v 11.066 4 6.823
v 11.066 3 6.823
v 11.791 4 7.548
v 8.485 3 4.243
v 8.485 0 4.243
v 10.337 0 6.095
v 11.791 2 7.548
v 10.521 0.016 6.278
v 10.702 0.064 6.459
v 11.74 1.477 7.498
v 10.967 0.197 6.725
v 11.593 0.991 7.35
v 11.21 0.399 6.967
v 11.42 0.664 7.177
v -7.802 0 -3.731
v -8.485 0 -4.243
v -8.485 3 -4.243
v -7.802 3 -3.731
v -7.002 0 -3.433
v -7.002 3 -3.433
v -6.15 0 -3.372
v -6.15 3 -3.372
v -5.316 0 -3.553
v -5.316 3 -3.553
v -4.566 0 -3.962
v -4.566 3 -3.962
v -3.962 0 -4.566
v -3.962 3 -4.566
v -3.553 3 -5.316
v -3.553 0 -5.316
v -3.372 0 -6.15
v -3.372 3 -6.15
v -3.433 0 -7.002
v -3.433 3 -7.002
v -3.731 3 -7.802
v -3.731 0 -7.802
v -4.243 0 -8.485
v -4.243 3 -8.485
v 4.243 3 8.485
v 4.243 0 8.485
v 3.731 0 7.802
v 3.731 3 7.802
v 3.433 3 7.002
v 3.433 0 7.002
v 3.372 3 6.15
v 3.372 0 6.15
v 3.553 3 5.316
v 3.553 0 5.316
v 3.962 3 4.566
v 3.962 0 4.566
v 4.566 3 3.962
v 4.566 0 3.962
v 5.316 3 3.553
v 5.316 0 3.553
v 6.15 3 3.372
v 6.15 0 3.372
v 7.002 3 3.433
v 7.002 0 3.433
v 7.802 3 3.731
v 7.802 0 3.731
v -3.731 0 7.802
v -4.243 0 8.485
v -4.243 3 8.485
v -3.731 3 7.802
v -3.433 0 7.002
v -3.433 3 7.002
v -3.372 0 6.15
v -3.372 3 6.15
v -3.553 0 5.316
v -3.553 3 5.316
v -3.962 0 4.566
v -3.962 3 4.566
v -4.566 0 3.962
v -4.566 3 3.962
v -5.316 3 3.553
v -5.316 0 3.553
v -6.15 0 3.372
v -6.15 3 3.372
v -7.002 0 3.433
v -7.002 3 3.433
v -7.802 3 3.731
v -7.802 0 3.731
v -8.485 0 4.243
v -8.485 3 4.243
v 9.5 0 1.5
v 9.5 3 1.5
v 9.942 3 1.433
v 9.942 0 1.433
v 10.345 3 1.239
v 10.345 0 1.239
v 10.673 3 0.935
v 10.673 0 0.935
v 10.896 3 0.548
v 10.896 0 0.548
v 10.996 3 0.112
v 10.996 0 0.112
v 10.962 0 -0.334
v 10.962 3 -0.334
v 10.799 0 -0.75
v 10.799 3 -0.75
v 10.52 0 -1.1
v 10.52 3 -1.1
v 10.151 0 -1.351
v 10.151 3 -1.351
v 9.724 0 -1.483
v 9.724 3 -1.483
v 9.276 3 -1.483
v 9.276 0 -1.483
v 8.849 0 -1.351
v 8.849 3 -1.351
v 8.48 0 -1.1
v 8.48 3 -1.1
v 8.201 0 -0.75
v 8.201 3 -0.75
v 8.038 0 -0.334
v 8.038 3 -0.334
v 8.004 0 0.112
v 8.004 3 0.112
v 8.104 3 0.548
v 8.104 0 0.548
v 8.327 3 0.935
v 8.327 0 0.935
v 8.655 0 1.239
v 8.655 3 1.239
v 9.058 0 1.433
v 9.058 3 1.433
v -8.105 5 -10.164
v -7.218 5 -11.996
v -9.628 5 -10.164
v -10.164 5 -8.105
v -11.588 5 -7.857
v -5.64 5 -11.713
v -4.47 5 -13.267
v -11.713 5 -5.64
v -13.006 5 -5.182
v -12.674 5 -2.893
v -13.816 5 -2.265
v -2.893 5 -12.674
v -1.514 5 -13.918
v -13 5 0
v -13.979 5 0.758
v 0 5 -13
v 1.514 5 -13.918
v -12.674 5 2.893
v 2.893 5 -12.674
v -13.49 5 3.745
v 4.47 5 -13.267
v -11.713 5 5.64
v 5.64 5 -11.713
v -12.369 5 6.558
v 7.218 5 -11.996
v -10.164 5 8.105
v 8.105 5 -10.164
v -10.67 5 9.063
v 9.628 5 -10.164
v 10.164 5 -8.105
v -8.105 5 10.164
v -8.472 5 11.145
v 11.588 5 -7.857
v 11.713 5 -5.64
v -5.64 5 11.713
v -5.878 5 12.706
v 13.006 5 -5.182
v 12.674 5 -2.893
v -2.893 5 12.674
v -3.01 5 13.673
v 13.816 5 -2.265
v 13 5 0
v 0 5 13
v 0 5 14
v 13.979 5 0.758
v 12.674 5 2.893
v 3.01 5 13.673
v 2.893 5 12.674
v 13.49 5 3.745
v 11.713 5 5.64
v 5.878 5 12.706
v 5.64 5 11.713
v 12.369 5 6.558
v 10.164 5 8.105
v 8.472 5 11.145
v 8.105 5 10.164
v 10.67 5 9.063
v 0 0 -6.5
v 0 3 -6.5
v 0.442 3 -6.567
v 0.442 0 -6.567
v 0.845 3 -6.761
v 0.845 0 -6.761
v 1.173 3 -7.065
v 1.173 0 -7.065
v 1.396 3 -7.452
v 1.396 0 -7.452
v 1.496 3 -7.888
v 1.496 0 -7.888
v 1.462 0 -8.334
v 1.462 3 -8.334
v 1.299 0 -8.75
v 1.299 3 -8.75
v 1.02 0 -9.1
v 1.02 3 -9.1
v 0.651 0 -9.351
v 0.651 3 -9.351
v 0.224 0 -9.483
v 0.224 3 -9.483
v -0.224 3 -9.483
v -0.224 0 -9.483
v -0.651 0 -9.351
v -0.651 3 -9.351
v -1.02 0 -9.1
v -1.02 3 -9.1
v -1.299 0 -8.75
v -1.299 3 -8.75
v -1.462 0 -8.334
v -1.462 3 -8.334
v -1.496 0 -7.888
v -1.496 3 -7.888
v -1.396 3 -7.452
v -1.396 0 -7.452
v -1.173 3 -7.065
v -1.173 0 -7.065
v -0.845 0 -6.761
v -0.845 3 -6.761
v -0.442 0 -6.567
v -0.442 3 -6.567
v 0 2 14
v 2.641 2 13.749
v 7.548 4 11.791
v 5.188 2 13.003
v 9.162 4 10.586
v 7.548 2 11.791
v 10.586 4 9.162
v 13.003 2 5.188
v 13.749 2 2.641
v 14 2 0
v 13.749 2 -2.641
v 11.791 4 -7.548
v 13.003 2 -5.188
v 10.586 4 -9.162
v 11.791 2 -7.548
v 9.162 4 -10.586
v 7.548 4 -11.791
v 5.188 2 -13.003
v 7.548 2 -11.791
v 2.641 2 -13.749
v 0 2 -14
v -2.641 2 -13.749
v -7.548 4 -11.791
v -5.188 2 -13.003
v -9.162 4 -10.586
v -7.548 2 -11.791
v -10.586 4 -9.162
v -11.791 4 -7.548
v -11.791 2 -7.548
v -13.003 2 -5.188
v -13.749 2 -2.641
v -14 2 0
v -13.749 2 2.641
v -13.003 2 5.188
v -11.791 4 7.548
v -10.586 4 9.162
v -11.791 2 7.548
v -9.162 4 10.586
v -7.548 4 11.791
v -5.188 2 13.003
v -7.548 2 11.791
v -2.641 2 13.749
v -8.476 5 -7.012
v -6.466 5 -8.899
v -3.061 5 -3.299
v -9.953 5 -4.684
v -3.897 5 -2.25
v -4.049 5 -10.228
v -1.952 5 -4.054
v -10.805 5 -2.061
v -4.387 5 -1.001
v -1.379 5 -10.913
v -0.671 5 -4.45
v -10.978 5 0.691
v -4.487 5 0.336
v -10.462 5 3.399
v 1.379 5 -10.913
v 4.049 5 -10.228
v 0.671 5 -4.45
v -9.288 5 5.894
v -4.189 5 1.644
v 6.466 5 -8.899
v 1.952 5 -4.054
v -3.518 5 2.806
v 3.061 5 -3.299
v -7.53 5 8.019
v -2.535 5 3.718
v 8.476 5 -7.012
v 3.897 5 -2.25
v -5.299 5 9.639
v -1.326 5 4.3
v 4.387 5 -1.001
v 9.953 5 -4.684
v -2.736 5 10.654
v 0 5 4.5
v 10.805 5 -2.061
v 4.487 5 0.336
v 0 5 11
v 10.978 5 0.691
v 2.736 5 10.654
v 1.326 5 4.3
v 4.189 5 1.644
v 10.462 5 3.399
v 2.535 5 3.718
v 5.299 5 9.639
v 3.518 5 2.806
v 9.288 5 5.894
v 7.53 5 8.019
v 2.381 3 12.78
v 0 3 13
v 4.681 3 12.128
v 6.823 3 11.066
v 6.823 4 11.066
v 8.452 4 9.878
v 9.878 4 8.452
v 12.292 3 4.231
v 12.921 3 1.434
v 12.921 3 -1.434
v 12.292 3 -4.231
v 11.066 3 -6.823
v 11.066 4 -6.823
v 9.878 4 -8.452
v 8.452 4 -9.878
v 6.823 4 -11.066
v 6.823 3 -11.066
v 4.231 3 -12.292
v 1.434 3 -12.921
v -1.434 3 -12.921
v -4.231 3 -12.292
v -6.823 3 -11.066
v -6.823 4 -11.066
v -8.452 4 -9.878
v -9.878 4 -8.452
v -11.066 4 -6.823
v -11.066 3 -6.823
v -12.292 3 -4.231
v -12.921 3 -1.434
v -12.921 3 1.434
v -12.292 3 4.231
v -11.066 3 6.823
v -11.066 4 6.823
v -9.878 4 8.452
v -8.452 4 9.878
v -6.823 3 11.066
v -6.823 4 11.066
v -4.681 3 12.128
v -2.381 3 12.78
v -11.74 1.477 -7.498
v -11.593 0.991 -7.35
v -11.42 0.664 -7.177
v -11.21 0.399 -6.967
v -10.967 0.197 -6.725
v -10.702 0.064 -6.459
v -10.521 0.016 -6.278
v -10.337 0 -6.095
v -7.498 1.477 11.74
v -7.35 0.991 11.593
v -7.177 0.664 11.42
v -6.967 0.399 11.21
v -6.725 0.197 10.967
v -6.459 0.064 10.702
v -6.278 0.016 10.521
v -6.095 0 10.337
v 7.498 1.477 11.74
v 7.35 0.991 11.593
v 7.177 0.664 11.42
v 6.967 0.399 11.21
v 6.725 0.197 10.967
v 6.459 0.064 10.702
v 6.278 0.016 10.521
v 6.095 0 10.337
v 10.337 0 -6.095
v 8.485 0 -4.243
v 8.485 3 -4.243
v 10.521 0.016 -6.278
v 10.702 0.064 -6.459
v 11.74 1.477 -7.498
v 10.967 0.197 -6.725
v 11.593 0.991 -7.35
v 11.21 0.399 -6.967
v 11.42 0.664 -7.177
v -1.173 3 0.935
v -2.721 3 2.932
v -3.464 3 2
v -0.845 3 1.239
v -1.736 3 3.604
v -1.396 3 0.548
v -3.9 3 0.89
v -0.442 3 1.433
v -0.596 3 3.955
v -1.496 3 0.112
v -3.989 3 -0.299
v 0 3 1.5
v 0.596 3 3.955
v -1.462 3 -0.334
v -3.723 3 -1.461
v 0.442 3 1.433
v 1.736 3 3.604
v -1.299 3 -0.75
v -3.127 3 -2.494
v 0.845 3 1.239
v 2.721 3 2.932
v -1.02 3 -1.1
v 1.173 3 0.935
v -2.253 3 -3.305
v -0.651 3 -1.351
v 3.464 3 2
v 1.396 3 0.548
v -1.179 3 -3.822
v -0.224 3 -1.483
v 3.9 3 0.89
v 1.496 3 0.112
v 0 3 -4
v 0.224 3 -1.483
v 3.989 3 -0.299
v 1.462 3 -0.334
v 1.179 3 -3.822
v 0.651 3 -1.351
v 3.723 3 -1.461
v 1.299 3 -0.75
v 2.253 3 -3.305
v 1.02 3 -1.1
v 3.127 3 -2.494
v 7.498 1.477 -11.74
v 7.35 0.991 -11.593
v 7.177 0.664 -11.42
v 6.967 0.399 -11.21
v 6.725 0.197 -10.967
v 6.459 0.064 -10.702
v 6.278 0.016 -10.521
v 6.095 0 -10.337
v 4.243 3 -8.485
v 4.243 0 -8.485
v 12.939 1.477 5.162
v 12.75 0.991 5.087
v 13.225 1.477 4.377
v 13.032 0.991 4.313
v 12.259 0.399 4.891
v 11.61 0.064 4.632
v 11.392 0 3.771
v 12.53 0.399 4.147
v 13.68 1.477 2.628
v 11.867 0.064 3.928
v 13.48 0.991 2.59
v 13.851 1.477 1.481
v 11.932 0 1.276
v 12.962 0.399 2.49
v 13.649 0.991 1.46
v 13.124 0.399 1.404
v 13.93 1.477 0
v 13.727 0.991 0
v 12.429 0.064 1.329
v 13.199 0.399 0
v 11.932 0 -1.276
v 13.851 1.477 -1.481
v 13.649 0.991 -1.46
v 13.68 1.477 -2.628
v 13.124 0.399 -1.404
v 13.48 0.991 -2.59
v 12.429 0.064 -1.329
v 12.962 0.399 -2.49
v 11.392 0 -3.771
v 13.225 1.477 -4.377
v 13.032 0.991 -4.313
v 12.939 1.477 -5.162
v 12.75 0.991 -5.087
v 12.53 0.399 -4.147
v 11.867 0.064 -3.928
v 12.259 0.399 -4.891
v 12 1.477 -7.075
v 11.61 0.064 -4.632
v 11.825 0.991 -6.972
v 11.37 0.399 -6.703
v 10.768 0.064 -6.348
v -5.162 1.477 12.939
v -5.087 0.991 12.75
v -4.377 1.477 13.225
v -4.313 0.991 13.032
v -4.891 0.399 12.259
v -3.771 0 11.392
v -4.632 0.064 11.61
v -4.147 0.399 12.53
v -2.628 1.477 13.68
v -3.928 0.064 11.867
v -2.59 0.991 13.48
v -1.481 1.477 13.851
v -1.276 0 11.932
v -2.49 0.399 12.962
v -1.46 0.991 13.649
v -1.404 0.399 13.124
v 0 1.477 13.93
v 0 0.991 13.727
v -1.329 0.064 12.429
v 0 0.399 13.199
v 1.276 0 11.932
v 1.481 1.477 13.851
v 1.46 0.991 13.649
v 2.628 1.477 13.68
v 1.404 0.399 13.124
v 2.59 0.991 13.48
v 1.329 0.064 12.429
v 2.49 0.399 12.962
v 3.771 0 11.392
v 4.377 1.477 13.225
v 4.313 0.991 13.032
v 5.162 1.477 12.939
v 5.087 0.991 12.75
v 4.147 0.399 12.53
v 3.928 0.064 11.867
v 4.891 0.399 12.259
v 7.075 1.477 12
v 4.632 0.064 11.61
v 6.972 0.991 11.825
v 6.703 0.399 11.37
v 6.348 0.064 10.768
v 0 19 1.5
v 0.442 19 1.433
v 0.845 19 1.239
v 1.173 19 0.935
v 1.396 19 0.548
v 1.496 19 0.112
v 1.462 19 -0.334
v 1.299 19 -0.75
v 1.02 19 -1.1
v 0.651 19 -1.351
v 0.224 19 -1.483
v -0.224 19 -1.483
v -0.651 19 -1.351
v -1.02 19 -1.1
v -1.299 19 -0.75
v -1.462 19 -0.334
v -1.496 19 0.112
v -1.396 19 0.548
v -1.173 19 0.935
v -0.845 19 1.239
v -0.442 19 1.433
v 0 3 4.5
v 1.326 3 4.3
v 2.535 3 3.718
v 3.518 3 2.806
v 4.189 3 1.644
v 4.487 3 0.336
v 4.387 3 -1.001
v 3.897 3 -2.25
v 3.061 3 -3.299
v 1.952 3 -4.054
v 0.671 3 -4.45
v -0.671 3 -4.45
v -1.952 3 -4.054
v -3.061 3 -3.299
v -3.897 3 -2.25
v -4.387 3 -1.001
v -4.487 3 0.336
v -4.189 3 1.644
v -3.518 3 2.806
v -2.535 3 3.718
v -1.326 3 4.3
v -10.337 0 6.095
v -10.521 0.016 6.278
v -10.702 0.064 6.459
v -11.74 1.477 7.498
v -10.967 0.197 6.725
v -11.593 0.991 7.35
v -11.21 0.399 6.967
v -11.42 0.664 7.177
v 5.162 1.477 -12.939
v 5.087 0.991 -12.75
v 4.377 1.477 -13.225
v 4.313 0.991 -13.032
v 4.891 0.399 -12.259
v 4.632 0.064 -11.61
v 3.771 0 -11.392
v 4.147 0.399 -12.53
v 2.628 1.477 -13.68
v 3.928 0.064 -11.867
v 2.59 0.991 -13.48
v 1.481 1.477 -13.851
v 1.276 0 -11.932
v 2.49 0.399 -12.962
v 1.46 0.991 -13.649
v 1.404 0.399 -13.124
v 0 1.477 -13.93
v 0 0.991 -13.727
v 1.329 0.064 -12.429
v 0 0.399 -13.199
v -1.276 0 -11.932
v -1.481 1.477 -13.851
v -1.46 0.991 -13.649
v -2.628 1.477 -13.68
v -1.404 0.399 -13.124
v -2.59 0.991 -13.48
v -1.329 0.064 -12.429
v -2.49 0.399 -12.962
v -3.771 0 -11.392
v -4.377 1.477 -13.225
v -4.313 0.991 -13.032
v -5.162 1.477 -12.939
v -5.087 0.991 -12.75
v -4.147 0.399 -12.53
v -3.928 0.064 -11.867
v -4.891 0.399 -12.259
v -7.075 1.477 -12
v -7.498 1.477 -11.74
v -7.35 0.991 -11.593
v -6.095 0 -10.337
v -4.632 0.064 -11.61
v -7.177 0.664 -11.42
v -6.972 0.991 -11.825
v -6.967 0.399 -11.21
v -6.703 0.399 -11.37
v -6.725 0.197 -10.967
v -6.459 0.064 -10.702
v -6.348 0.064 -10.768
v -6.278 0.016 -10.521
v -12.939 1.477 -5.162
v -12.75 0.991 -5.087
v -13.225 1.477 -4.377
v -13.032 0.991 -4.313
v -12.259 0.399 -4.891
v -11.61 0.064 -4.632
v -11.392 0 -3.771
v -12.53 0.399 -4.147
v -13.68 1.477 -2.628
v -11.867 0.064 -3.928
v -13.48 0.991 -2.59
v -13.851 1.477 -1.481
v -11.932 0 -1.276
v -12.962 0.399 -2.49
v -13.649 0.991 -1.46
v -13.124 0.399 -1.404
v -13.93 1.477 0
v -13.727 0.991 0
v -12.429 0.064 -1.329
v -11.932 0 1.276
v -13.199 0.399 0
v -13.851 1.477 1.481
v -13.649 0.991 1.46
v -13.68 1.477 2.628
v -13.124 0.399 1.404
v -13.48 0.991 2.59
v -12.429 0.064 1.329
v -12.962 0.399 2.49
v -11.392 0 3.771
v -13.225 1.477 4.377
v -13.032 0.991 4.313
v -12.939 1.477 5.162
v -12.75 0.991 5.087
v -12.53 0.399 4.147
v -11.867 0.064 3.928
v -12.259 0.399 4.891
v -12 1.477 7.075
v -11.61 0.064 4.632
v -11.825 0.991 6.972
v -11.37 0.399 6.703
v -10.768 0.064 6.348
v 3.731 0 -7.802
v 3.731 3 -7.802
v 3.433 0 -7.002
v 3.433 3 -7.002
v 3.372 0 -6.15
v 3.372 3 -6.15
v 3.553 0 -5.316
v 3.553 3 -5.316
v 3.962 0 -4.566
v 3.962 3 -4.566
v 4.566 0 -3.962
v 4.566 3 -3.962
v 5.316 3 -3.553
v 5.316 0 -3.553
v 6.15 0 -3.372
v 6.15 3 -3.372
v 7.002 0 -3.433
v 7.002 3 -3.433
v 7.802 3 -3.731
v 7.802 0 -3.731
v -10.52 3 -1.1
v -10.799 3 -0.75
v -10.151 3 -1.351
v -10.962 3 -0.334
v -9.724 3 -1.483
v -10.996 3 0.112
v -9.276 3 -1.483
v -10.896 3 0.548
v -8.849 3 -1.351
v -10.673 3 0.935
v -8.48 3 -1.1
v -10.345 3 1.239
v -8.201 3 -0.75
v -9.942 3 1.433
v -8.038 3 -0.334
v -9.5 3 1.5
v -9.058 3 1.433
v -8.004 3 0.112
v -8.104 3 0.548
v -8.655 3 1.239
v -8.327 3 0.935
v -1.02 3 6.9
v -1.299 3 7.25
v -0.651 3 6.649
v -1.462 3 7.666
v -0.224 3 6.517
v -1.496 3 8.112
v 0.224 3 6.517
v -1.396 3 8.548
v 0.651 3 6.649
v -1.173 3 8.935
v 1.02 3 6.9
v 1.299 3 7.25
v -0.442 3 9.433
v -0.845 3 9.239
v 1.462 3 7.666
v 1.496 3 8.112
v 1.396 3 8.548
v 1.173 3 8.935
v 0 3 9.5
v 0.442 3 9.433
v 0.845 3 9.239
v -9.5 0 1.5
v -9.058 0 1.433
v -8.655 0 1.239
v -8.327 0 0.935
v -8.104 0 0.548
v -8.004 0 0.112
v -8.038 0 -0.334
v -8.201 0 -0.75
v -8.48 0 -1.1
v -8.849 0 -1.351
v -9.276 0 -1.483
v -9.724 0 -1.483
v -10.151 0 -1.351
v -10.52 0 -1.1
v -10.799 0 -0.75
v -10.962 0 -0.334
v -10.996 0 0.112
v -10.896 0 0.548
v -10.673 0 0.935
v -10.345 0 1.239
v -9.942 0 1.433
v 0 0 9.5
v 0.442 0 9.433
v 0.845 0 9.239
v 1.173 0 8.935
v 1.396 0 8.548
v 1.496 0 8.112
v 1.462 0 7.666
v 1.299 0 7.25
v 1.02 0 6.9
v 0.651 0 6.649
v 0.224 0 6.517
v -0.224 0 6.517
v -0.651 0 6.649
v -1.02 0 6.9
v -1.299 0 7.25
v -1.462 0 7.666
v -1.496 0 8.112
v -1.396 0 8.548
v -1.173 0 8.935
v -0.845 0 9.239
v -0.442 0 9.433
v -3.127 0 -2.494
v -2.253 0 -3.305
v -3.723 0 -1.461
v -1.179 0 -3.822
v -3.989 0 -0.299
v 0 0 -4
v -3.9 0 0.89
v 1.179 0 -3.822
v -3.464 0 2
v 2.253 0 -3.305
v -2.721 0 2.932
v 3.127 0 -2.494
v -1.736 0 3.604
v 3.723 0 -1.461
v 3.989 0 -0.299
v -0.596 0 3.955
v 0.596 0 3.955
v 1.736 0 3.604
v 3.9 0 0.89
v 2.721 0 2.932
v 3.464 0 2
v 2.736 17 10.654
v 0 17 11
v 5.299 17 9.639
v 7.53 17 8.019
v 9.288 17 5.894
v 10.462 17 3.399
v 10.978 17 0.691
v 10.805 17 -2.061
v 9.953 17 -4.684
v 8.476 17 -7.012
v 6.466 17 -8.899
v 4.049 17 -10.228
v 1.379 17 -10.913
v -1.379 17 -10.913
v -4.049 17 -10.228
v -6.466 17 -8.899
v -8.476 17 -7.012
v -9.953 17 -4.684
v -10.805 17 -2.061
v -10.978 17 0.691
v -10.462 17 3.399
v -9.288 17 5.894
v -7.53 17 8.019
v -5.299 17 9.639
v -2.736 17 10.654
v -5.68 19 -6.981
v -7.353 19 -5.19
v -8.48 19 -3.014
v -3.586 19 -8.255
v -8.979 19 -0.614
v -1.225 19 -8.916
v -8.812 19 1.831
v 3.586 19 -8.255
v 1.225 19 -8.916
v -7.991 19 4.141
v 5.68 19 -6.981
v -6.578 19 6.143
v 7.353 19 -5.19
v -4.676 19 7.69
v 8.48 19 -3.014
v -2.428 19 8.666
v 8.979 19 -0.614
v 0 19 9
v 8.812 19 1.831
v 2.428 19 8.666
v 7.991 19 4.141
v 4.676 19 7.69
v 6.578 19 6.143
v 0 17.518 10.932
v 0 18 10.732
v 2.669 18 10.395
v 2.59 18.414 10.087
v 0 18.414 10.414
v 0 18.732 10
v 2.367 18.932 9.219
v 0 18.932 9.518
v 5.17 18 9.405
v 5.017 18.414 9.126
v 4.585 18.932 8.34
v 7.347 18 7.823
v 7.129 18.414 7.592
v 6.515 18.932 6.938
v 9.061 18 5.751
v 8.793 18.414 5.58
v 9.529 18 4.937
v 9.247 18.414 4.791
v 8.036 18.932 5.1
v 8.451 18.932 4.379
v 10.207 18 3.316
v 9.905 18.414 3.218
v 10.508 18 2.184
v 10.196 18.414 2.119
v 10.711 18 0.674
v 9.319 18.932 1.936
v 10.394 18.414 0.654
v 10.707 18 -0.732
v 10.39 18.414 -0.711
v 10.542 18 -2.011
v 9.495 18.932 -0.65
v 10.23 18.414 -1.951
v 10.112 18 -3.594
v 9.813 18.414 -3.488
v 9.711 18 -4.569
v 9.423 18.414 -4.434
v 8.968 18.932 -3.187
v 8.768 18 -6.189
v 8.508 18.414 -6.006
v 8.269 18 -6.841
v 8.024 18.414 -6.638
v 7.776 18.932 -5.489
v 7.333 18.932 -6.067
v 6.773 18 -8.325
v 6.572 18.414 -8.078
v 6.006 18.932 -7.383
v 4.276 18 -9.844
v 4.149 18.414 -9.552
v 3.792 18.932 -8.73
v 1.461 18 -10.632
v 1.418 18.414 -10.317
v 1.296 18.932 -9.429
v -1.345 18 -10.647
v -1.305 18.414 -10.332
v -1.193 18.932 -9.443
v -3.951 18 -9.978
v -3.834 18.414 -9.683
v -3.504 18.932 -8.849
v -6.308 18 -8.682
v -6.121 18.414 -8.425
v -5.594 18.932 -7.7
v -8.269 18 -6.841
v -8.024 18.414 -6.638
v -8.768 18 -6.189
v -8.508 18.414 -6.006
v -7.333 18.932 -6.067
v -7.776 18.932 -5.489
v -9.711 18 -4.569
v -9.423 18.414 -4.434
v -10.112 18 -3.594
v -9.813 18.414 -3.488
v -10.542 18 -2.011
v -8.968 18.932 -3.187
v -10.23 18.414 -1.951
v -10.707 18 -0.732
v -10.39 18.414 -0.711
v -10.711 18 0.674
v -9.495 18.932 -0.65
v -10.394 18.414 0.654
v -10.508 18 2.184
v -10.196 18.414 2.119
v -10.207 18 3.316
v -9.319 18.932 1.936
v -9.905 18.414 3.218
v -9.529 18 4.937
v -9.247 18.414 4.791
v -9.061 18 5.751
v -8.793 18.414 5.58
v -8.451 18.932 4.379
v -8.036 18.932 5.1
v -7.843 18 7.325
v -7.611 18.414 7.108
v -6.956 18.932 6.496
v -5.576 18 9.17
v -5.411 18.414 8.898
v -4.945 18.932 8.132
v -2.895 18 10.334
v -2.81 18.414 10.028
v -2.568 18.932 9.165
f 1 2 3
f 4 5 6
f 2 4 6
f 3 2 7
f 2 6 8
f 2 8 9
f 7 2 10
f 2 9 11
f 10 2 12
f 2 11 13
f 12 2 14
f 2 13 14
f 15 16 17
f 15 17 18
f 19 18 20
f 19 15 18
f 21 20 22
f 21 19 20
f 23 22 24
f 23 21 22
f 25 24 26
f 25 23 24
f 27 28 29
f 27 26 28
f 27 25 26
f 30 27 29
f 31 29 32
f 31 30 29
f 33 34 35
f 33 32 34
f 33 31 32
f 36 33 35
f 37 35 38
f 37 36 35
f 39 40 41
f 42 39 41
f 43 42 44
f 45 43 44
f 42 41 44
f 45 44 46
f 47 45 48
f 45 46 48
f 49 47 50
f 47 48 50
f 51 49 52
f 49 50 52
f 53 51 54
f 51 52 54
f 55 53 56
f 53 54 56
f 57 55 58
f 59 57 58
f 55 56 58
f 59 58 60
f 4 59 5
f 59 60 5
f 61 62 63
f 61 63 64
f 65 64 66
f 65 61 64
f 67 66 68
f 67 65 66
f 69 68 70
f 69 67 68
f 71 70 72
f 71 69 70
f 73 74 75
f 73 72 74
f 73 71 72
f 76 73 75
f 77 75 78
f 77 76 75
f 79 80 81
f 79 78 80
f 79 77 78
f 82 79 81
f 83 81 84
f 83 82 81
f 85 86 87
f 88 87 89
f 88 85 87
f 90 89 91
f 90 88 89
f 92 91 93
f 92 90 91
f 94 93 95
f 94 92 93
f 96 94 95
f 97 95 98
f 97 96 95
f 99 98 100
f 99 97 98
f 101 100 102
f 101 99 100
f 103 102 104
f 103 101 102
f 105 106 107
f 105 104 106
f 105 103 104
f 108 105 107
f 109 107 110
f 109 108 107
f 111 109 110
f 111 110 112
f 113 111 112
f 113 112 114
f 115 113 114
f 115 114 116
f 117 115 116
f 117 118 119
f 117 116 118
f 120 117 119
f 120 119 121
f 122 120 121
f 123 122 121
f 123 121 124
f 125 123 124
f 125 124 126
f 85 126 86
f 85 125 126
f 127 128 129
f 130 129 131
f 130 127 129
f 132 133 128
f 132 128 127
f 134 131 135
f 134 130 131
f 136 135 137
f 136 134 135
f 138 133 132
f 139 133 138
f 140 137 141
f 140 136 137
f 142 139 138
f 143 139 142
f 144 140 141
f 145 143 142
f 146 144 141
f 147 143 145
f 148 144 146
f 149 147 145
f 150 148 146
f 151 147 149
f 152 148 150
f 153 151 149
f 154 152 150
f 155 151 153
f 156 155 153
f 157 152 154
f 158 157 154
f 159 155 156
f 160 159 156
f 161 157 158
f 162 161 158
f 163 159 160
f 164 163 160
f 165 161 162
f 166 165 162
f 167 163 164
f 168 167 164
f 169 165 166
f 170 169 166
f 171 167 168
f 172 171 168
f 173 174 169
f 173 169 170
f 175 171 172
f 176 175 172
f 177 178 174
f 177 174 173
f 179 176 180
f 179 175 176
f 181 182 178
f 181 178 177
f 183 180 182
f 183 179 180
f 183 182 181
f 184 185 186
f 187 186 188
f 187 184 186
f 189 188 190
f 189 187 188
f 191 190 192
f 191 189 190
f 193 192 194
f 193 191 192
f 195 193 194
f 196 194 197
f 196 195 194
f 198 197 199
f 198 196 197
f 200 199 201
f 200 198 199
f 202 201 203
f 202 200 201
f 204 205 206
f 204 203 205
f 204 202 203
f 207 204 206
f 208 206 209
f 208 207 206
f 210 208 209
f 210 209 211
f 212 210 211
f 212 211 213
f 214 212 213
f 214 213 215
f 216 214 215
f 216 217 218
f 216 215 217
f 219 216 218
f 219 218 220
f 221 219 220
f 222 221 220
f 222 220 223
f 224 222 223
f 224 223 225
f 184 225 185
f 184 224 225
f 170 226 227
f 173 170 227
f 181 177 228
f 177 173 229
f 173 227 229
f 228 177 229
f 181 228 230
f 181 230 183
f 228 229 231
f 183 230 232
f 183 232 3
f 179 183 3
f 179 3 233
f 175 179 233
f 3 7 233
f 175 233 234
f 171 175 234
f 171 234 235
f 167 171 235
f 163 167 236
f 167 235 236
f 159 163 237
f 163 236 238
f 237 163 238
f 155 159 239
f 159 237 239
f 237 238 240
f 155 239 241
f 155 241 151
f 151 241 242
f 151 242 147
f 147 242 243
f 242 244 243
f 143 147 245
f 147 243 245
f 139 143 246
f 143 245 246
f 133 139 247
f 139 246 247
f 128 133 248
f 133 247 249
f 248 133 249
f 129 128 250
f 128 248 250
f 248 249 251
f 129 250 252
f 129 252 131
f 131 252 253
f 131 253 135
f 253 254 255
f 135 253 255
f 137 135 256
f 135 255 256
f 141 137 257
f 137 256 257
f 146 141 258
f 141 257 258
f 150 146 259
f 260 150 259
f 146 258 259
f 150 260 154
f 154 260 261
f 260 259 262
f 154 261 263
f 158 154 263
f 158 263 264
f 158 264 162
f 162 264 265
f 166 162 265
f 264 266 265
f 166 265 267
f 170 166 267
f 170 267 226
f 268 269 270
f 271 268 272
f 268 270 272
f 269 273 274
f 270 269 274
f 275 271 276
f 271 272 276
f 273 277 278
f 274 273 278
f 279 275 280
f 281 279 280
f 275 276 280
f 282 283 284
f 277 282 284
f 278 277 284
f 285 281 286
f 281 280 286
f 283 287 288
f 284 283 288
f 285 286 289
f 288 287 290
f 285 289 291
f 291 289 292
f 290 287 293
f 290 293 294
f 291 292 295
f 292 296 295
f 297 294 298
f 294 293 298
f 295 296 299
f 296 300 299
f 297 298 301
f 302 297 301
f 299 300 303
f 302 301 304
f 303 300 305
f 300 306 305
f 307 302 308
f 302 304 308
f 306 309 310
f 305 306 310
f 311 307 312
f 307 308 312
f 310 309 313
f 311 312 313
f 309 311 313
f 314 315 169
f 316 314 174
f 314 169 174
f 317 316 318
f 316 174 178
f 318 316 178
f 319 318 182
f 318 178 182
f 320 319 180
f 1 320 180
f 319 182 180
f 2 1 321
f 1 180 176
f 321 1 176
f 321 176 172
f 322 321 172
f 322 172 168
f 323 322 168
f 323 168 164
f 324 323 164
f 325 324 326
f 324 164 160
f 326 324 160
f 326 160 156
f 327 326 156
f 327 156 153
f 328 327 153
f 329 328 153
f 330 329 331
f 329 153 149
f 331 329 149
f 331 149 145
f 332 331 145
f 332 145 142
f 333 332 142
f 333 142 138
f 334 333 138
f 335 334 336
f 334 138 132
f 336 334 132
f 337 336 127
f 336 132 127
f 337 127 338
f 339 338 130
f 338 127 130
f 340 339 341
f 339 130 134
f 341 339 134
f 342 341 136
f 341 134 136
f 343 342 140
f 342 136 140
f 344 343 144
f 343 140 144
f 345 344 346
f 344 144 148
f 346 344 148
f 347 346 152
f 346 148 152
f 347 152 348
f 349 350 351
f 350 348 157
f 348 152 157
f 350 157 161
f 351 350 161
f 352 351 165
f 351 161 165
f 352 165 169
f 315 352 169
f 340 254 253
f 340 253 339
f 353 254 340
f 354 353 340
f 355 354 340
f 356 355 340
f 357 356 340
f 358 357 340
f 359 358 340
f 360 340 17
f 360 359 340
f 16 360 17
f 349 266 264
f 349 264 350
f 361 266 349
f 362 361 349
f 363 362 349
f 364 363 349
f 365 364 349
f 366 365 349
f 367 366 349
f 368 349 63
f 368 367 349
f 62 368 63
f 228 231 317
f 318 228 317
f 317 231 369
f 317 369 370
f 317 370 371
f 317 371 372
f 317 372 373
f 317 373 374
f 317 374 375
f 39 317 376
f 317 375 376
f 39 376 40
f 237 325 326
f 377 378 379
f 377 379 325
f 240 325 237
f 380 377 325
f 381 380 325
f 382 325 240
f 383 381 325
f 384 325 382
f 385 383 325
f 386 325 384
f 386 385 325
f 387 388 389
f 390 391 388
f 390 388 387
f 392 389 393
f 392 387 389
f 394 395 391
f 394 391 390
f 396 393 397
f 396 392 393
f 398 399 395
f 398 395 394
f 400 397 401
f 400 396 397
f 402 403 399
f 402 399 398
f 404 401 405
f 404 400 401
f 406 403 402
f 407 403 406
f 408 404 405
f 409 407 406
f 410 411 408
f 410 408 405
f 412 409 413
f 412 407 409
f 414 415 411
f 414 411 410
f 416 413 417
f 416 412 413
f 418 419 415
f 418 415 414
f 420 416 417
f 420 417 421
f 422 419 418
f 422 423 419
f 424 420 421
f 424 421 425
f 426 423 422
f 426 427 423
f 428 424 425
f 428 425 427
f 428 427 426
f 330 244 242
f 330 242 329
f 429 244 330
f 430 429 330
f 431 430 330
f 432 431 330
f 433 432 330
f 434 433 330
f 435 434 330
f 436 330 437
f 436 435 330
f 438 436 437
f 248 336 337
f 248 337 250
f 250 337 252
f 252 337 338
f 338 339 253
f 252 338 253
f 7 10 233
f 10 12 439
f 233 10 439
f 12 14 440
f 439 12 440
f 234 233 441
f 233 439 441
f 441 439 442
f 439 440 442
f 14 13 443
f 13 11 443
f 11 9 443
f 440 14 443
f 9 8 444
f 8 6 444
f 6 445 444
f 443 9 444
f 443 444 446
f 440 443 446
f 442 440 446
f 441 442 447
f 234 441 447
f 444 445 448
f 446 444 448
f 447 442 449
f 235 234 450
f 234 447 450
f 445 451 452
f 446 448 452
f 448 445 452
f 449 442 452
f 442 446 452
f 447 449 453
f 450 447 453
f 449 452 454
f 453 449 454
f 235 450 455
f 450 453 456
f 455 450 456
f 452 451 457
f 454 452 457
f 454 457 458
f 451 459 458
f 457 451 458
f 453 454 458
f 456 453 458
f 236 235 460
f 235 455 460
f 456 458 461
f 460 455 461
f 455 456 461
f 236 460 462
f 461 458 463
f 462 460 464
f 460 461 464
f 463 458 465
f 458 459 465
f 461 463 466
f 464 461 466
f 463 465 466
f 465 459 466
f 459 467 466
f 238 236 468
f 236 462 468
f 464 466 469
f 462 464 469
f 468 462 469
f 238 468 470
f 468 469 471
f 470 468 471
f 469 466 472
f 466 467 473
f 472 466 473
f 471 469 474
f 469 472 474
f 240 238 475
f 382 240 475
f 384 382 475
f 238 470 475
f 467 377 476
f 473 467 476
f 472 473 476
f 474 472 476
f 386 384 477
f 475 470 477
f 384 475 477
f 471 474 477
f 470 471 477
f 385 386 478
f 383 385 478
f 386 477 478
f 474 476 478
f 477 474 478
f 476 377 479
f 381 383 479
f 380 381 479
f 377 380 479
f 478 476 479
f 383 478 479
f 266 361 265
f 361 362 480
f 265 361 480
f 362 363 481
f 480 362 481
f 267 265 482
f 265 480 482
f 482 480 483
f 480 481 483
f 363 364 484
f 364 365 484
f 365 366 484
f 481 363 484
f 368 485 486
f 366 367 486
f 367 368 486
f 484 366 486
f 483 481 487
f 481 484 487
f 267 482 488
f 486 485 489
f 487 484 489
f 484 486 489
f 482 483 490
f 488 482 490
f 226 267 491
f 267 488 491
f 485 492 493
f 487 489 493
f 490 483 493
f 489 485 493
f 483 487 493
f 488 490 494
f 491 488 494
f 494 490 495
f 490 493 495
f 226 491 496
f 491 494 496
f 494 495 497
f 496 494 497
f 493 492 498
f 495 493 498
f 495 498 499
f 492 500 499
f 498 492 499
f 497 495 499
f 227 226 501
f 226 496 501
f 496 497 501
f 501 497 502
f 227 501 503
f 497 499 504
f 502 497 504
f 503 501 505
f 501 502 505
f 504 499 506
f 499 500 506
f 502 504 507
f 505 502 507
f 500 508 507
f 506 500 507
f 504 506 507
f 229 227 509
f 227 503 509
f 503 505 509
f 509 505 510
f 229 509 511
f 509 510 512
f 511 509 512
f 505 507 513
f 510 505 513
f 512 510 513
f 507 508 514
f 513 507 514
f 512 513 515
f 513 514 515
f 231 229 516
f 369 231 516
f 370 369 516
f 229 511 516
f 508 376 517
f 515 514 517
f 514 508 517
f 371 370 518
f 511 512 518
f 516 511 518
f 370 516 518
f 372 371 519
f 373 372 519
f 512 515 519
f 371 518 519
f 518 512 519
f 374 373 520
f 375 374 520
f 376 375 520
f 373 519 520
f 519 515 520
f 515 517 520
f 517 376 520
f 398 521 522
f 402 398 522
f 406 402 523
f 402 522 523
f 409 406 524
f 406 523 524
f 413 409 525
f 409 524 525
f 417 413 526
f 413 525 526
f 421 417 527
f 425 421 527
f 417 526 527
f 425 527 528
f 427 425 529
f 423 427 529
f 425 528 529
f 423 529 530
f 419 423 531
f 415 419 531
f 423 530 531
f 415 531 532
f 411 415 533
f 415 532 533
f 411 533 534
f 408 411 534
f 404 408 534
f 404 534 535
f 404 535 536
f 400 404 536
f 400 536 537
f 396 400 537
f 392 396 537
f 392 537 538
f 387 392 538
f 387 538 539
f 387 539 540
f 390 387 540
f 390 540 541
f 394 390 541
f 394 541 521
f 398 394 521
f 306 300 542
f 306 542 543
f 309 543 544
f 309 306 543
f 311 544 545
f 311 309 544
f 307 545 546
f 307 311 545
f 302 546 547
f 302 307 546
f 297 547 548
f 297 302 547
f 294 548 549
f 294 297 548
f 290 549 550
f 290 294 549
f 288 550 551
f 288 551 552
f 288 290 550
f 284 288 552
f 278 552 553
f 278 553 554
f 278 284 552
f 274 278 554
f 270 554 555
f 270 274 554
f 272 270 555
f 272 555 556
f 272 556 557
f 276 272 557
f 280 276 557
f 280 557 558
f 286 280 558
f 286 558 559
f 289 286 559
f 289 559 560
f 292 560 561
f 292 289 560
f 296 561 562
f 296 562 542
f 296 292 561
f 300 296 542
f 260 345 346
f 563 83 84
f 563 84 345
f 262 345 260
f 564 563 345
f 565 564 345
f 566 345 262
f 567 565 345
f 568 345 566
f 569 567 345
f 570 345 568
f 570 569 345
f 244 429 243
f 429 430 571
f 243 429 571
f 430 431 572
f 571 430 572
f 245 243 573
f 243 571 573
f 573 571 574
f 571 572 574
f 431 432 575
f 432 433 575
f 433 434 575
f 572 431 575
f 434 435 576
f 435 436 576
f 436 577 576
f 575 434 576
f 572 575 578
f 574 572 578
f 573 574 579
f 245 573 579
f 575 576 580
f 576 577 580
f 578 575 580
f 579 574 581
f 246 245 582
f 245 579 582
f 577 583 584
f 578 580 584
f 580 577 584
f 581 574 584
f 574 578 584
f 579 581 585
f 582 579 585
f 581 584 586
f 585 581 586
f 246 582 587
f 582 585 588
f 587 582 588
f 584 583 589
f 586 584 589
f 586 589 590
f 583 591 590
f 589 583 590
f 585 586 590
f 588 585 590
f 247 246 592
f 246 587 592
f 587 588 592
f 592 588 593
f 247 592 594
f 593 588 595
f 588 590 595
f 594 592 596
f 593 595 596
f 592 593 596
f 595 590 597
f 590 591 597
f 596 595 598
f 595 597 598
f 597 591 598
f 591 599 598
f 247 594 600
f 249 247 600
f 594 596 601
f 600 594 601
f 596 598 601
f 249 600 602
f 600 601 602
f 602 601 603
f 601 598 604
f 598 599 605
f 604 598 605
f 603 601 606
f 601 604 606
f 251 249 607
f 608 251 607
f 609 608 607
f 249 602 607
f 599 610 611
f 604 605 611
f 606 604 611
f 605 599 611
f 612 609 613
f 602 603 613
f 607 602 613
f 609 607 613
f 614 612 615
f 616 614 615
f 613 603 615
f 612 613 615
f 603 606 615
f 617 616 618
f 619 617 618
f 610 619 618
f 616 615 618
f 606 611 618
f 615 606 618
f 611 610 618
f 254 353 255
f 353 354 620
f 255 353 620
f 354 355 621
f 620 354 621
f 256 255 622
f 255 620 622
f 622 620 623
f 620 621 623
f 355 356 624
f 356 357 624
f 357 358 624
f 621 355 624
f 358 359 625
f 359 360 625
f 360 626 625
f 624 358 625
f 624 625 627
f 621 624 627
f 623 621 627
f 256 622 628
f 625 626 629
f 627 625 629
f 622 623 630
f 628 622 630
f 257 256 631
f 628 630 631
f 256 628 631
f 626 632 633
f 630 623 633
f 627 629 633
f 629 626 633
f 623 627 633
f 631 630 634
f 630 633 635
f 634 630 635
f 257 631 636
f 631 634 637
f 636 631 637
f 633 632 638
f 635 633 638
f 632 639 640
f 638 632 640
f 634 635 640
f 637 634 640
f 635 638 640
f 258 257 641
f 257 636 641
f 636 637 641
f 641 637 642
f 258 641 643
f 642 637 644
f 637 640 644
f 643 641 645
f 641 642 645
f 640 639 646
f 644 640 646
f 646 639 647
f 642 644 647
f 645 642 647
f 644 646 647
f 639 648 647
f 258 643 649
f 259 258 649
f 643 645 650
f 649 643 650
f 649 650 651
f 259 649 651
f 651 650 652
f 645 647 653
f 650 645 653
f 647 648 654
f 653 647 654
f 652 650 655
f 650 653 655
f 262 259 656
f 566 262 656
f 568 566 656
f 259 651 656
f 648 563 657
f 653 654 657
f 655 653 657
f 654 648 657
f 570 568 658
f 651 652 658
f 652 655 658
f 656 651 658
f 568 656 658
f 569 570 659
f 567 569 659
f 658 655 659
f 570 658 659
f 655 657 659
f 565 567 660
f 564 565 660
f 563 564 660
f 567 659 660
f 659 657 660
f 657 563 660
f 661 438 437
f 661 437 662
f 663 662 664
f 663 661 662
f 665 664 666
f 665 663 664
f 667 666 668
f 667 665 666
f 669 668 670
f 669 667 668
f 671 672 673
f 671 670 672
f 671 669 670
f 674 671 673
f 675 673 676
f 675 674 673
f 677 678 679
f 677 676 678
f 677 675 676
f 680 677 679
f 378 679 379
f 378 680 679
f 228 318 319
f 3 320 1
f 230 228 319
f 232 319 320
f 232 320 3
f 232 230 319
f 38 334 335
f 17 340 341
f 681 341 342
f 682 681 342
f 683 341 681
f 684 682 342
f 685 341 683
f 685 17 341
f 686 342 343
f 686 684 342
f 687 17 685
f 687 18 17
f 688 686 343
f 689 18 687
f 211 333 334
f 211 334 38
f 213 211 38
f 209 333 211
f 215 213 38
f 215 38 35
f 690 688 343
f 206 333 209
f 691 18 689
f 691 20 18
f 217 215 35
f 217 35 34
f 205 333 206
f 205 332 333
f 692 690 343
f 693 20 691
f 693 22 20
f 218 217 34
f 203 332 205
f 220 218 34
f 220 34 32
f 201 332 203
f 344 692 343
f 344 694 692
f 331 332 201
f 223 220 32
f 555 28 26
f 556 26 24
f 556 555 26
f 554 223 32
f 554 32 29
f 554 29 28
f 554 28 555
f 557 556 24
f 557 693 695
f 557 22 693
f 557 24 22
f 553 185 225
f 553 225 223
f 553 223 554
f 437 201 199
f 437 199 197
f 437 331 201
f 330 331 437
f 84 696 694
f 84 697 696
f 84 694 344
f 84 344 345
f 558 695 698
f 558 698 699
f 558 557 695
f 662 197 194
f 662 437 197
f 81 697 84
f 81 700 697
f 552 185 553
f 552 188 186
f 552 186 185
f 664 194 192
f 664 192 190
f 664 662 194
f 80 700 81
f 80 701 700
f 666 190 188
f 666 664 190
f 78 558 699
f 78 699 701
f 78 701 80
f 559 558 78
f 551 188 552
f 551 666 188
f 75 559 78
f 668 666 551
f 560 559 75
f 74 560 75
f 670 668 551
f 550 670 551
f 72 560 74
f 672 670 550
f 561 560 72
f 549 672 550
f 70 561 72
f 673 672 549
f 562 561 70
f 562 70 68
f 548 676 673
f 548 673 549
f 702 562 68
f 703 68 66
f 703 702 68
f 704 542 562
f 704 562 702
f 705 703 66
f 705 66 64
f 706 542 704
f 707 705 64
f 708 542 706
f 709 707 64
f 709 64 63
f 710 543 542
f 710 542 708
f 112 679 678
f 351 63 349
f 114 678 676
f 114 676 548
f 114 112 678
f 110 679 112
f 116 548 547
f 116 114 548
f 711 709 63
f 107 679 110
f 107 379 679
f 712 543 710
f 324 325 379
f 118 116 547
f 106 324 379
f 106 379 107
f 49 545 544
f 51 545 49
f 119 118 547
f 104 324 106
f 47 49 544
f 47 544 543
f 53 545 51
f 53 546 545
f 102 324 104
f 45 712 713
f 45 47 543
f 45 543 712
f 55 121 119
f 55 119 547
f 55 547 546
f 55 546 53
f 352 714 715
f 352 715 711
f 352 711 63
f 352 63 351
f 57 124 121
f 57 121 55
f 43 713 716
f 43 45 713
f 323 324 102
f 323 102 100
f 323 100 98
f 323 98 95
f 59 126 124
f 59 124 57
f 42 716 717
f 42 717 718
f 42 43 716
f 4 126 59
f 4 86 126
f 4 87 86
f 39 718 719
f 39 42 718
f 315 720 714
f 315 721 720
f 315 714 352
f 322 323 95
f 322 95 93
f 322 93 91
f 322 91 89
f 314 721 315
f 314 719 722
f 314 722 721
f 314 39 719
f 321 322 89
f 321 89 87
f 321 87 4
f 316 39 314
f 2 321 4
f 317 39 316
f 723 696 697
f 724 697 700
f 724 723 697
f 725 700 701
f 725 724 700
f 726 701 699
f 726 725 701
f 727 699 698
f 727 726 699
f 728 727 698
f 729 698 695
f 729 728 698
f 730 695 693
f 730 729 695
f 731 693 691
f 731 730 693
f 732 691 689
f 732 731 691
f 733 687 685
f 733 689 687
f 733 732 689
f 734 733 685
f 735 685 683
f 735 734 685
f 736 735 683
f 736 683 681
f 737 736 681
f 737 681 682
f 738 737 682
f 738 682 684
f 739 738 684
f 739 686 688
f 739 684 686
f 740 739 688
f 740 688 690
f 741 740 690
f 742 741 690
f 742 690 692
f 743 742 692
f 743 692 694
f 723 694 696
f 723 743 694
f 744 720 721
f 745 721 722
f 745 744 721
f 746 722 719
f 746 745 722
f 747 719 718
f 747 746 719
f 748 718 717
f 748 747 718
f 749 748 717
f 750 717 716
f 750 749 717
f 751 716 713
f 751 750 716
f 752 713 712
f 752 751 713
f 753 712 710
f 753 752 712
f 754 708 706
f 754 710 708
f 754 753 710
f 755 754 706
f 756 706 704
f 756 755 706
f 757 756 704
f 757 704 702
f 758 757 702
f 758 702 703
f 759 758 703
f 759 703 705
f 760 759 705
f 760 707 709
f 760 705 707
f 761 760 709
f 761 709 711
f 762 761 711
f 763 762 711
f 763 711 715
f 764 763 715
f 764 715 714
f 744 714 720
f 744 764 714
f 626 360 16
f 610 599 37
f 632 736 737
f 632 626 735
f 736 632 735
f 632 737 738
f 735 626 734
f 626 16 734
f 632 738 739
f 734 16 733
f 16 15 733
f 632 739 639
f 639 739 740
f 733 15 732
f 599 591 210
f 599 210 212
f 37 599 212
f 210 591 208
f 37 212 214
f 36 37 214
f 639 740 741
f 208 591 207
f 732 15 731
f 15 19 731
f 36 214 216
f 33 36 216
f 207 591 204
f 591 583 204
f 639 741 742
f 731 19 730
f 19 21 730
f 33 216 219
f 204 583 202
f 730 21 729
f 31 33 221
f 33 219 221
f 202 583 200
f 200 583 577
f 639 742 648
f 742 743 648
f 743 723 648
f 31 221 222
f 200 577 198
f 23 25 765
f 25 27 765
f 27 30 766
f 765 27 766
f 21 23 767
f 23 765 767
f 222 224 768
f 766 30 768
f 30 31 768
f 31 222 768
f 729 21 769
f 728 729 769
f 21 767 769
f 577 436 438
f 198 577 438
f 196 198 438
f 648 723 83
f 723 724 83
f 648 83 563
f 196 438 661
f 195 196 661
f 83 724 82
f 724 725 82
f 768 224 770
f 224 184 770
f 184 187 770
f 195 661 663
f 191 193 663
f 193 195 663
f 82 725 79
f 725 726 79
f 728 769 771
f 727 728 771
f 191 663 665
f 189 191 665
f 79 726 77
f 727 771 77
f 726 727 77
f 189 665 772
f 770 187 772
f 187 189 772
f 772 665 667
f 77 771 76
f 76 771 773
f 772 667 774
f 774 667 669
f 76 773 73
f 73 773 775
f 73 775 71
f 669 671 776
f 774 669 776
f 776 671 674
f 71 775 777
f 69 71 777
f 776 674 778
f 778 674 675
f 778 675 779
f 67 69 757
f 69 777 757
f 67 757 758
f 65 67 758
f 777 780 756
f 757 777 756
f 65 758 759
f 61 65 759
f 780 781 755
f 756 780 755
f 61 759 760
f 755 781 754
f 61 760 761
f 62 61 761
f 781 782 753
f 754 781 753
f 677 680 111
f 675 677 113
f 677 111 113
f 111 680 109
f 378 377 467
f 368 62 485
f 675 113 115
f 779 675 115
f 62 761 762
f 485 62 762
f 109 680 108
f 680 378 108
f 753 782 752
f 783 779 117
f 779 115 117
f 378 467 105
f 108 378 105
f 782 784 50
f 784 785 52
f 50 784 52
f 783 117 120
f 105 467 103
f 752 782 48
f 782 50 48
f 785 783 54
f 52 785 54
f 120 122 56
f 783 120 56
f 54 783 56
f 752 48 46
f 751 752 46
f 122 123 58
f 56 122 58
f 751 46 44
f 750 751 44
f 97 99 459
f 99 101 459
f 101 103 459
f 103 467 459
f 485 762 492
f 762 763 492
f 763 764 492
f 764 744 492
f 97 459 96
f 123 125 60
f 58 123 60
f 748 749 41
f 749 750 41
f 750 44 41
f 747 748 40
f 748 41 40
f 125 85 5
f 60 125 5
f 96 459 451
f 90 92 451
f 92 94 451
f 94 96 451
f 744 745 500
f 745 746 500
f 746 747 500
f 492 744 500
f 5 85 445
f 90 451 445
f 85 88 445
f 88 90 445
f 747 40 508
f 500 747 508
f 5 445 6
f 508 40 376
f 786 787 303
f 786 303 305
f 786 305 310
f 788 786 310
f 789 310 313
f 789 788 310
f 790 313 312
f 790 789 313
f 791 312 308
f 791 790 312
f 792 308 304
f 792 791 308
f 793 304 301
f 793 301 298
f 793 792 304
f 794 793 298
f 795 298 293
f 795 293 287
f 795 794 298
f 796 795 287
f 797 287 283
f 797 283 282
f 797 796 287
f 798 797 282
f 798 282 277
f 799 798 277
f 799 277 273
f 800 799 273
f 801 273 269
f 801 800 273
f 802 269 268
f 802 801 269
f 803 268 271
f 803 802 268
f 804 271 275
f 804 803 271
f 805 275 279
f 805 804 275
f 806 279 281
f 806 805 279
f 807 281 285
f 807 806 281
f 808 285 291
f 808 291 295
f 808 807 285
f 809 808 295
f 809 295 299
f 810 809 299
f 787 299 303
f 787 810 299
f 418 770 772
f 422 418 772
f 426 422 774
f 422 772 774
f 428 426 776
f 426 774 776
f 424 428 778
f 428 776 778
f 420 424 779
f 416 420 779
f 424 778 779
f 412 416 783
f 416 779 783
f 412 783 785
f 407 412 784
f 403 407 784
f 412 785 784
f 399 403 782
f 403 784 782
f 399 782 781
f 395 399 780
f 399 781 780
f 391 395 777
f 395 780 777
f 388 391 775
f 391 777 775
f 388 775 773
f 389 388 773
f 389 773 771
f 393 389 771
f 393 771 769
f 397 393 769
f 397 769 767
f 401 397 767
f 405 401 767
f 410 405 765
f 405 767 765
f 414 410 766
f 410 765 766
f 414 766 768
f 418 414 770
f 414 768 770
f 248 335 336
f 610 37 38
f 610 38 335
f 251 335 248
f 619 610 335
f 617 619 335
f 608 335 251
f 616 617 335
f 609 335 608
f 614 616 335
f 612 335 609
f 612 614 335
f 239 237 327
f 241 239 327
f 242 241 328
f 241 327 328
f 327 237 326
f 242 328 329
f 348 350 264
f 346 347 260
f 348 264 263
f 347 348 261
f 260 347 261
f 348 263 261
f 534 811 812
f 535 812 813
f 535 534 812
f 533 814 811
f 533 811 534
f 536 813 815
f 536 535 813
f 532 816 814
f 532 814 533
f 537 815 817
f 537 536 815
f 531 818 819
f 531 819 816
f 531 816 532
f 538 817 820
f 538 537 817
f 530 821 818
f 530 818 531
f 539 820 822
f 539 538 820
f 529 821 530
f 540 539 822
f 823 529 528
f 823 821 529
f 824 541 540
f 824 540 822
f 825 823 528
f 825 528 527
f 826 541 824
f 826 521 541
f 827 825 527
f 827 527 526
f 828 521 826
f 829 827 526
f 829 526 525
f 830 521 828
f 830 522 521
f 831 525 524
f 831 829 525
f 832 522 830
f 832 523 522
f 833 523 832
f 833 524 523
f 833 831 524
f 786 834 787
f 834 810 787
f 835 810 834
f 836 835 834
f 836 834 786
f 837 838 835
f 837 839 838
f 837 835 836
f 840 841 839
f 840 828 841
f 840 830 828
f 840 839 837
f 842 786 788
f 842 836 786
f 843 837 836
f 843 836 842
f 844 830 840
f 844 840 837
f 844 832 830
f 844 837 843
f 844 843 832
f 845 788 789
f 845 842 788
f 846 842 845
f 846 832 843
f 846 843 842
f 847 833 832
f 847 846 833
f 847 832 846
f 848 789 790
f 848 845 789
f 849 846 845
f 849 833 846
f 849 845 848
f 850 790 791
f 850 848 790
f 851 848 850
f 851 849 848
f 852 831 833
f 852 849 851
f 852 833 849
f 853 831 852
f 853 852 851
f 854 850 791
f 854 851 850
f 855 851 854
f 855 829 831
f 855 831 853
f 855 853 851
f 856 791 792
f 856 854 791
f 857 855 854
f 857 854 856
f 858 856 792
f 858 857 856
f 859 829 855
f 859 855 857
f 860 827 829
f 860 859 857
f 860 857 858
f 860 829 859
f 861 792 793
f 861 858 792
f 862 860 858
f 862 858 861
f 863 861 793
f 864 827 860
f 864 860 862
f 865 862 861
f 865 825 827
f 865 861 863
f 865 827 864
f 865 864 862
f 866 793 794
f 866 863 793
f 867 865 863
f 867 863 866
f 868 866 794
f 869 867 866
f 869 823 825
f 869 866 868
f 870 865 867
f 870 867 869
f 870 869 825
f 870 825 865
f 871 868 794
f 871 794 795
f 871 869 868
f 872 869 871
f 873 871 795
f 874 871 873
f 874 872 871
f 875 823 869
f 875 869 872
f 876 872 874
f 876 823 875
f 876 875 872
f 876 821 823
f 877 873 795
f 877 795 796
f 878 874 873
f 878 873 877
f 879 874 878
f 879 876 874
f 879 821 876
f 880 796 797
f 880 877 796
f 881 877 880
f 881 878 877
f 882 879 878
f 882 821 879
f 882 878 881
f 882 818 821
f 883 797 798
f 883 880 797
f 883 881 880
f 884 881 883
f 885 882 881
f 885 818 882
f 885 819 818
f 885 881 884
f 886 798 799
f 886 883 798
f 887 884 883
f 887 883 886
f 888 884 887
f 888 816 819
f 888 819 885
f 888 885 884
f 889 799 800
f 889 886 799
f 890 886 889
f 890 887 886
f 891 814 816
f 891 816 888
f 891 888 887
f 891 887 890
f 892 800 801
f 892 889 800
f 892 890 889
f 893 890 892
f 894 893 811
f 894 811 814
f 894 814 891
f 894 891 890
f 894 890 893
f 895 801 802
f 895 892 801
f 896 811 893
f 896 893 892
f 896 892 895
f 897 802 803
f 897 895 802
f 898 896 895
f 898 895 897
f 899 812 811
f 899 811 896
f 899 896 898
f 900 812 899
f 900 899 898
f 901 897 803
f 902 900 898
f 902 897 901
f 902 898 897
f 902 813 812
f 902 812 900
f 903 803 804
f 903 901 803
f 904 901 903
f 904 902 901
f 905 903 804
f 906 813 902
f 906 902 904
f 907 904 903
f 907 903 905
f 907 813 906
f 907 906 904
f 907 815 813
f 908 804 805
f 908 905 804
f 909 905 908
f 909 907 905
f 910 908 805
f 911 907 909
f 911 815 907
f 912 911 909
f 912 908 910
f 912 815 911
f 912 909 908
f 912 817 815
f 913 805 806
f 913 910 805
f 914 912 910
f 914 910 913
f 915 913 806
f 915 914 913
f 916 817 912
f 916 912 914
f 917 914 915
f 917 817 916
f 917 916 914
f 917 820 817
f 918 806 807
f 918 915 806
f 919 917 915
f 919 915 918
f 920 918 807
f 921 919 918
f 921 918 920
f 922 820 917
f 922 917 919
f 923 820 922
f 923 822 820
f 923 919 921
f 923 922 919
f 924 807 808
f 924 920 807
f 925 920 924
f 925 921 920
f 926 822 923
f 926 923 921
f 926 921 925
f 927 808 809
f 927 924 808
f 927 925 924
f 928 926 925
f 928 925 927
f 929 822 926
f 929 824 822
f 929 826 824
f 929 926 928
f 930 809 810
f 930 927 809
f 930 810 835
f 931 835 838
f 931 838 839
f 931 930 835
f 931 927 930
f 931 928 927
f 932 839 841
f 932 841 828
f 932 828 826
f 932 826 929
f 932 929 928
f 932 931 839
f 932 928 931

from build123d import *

# Parameters (mm, degrees)
SKETCH_1_R          = 14
SKETCH_1_R_2        = 1.5
EXTRUDE_1_DEPTH     = 5
SKETCH_2_R          = 13
SKETCH_2_R_2        = 4.5
CUT_EXTRUDE_1_DEPTH = 2
SKETCH_3_R          = 1.5
CUT_EXTRUDE_2_DEPTH = 21.420577857
SKETCH_4_R          = 4
CUT_EXTRUDE_3_DEPTH = 3
CUT_EXTRUDE_4_DEPTH = 4
FILLET_1_R          = 2
EXTRUDE_START       = 14
SKETCH_6_R          = 11
SKETCH_6_R_2        = 1.5
EXTRUDE_3_DEPTH     = 14
FILLET_2_R          = 2


with BuildPart() as part:
    # 草图1 → 凸台-拉伸1 (new body)
    with BuildSketch(Plane(origin=(0, 0, 0), x_dir=(1, 0, 0), z_dir=(0, 1, 0))):
        with Locations(Location((0, 0, 0), (0, 0, 270))):
            Circle(SKETCH_1_R)
        with Locations(Location((-9.5, 0, 0), (0, 0, 270))):
            Circle(SKETCH_1_R_2, mode=Mode.SUBTRACT)
        with Locations(Location((9.5, 0, 0), (0, 0, 270))):
            Circle(SKETCH_1_R_2, mode=Mode.SUBTRACT)
        with Locations(Location((0, 8, 0), (0, 0, 270))):
            Circle(SKETCH_1_R_2, mode=Mode.SUBTRACT)
        with Locations(Location((0, -8, 0), (0, 0, 270))):
            Circle(SKETCH_1_R_2, mode=Mode.SUBTRACT)
    extrude(amount=EXTRUDE_1_DEPTH)

    # 草图2 → 切除-拉伸1 (cut)
    with BuildSketch(Plane(origin=(0, 5, 0), x_dir=(1, 0, 0), z_dir=(0, 1, 0))):
        with Locations(Location((0, 0, 0), (0, 0, 270))):
            Circle(SKETCH_2_R)
        with Locations(Location((0, 0, 0), (0, 0, 270))):
            Circle(SKETCH_2_R_2, mode=Mode.SUBTRACT)
    extrude(amount=-CUT_EXTRUDE_1_DEPTH, mode=Mode.SUBTRACT)

    # 草图3 → 切除-拉伸2 (cut, through all)
    with BuildSketch(Plane(origin=(0, 5, 0), x_dir=(1, 0, 0), z_dir=(0, 1, 0))):
        with Locations(Location((0, 0, 0), (0, 0, 270))):
            Circle(SKETCH_3_R)
    extrude(amount=-CUT_EXTRUDE_2_DEPTH, mode=Mode.SUBTRACT)

    # 草图4 → 切除-拉伸3 (cut)
    with BuildSketch(Plane.XZ):
        with Locations(Location((0, 0, 0), (0, 0, 270))):
            Circle(SKETCH_4_R)
    extrude(amount=-CUT_EXTRUDE_3_DEPTH, mode=Mode.SUBTRACT)

    # 草图5 → 切除-拉伸4 (cut)
    with BuildSketch(Plane.XZ):
        with BuildLine():
            Line((8.485281374, 4.242640687), (11.790860146, 7.548219459))
            ThreePointArc((11.790860146, 7.548219459), (9.899494937, 9.899494937), (7.548219459, 11.790860146))
            Line((7.548219459, 11.790860146), (4.242640687, 8.485281374))
            ThreePointArc((4.242640687, 8.485281374), (4.242640687, 4.242640687), (8.485281374, 4.242640687))
        make_face()
        with BuildLine():
            Line((8.485281374, -4.242640687), (11.790860146, -7.548219459))
            ThreePointArc((11.790860146, -7.548219459), (9.899494937, -9.899494937), (7.548219459, -11.790860146))
            Line((7.548219459, -11.790860146), (4.242640687, -8.485281374))
            ThreePointArc((4.242640687, -8.485281374), (4.242640687, -4.242640687), (8.485281374, -4.242640687))
        make_face()
        with BuildLine():
            Line((-4.242640687, -8.485281374), (-7.548219459, -11.790860146))
            ThreePointArc((-7.548219459, -11.790860146), (-9.899494937, -9.899494937), (-11.790860146, -7.548219459))
            Line((-11.790860146, -7.548219459), (-8.485281374, -4.242640687))
            ThreePointArc((-8.485281374, -4.242640687), (-4.242640687, -4.242640687), (-4.242640687, -8.485281374))
        make_face()
        with BuildLine():
            Line((-8.485281374, 4.242640687), (-11.790860146, 7.548219459))
            ThreePointArc((-11.790860146, 7.548219459), (-9.899494937, 9.899494937), (-7.548219459, 11.790860146))
            Line((-7.548219459, 11.790860146), (-4.242640687, 8.485281374))
            ThreePointArc((-4.242640687, 8.485281374), (-4.242640687, 4.242640687), (-8.485281374, 4.242640687))
        make_face()
    extrude(amount=-CUT_EXTRUDE_4_DEPTH, mode=Mode.SUBTRACT)

    # 圆角1
    fillet_1_edges = [part.edges().sort_by_distance(p)[0] for p in [
        (3.932426601, 0, 13.436369339),
        (14, 0, 0),
        (0, 0, -14),
        (-14, 0, 0),
    ]]
    fillet(fillet_1_edges, radius=FILLET_1_R)

    # 草图6 → 凸台-拉伸3 (add)
    with BuildSketch(Plane(origin=(0, 5, 0), x_dir=(1, 0, 0), z_dir=(0, 1, 0)).offset(EXTRUDE_START)):
        with Locations(Location((0, 0, 0), (0, 0, 270))):
            Circle(SKETCH_6_R)
        with Locations(Location((0, 0, 0), (0, 0, 270))):
            Circle(SKETCH_6_R_2, mode=Mode.SUBTRACT)
    extrude(amount=-EXTRUDE_3_DEPTH)

    # 圆角2
    fillet_2_edges = [part.edges().sort_by_distance(p)[0] for p in [
        (0, 19, -11),
    ]]
    fillet(fillet_2_edges, radius=FILLET_2_R)


solid = part.part
